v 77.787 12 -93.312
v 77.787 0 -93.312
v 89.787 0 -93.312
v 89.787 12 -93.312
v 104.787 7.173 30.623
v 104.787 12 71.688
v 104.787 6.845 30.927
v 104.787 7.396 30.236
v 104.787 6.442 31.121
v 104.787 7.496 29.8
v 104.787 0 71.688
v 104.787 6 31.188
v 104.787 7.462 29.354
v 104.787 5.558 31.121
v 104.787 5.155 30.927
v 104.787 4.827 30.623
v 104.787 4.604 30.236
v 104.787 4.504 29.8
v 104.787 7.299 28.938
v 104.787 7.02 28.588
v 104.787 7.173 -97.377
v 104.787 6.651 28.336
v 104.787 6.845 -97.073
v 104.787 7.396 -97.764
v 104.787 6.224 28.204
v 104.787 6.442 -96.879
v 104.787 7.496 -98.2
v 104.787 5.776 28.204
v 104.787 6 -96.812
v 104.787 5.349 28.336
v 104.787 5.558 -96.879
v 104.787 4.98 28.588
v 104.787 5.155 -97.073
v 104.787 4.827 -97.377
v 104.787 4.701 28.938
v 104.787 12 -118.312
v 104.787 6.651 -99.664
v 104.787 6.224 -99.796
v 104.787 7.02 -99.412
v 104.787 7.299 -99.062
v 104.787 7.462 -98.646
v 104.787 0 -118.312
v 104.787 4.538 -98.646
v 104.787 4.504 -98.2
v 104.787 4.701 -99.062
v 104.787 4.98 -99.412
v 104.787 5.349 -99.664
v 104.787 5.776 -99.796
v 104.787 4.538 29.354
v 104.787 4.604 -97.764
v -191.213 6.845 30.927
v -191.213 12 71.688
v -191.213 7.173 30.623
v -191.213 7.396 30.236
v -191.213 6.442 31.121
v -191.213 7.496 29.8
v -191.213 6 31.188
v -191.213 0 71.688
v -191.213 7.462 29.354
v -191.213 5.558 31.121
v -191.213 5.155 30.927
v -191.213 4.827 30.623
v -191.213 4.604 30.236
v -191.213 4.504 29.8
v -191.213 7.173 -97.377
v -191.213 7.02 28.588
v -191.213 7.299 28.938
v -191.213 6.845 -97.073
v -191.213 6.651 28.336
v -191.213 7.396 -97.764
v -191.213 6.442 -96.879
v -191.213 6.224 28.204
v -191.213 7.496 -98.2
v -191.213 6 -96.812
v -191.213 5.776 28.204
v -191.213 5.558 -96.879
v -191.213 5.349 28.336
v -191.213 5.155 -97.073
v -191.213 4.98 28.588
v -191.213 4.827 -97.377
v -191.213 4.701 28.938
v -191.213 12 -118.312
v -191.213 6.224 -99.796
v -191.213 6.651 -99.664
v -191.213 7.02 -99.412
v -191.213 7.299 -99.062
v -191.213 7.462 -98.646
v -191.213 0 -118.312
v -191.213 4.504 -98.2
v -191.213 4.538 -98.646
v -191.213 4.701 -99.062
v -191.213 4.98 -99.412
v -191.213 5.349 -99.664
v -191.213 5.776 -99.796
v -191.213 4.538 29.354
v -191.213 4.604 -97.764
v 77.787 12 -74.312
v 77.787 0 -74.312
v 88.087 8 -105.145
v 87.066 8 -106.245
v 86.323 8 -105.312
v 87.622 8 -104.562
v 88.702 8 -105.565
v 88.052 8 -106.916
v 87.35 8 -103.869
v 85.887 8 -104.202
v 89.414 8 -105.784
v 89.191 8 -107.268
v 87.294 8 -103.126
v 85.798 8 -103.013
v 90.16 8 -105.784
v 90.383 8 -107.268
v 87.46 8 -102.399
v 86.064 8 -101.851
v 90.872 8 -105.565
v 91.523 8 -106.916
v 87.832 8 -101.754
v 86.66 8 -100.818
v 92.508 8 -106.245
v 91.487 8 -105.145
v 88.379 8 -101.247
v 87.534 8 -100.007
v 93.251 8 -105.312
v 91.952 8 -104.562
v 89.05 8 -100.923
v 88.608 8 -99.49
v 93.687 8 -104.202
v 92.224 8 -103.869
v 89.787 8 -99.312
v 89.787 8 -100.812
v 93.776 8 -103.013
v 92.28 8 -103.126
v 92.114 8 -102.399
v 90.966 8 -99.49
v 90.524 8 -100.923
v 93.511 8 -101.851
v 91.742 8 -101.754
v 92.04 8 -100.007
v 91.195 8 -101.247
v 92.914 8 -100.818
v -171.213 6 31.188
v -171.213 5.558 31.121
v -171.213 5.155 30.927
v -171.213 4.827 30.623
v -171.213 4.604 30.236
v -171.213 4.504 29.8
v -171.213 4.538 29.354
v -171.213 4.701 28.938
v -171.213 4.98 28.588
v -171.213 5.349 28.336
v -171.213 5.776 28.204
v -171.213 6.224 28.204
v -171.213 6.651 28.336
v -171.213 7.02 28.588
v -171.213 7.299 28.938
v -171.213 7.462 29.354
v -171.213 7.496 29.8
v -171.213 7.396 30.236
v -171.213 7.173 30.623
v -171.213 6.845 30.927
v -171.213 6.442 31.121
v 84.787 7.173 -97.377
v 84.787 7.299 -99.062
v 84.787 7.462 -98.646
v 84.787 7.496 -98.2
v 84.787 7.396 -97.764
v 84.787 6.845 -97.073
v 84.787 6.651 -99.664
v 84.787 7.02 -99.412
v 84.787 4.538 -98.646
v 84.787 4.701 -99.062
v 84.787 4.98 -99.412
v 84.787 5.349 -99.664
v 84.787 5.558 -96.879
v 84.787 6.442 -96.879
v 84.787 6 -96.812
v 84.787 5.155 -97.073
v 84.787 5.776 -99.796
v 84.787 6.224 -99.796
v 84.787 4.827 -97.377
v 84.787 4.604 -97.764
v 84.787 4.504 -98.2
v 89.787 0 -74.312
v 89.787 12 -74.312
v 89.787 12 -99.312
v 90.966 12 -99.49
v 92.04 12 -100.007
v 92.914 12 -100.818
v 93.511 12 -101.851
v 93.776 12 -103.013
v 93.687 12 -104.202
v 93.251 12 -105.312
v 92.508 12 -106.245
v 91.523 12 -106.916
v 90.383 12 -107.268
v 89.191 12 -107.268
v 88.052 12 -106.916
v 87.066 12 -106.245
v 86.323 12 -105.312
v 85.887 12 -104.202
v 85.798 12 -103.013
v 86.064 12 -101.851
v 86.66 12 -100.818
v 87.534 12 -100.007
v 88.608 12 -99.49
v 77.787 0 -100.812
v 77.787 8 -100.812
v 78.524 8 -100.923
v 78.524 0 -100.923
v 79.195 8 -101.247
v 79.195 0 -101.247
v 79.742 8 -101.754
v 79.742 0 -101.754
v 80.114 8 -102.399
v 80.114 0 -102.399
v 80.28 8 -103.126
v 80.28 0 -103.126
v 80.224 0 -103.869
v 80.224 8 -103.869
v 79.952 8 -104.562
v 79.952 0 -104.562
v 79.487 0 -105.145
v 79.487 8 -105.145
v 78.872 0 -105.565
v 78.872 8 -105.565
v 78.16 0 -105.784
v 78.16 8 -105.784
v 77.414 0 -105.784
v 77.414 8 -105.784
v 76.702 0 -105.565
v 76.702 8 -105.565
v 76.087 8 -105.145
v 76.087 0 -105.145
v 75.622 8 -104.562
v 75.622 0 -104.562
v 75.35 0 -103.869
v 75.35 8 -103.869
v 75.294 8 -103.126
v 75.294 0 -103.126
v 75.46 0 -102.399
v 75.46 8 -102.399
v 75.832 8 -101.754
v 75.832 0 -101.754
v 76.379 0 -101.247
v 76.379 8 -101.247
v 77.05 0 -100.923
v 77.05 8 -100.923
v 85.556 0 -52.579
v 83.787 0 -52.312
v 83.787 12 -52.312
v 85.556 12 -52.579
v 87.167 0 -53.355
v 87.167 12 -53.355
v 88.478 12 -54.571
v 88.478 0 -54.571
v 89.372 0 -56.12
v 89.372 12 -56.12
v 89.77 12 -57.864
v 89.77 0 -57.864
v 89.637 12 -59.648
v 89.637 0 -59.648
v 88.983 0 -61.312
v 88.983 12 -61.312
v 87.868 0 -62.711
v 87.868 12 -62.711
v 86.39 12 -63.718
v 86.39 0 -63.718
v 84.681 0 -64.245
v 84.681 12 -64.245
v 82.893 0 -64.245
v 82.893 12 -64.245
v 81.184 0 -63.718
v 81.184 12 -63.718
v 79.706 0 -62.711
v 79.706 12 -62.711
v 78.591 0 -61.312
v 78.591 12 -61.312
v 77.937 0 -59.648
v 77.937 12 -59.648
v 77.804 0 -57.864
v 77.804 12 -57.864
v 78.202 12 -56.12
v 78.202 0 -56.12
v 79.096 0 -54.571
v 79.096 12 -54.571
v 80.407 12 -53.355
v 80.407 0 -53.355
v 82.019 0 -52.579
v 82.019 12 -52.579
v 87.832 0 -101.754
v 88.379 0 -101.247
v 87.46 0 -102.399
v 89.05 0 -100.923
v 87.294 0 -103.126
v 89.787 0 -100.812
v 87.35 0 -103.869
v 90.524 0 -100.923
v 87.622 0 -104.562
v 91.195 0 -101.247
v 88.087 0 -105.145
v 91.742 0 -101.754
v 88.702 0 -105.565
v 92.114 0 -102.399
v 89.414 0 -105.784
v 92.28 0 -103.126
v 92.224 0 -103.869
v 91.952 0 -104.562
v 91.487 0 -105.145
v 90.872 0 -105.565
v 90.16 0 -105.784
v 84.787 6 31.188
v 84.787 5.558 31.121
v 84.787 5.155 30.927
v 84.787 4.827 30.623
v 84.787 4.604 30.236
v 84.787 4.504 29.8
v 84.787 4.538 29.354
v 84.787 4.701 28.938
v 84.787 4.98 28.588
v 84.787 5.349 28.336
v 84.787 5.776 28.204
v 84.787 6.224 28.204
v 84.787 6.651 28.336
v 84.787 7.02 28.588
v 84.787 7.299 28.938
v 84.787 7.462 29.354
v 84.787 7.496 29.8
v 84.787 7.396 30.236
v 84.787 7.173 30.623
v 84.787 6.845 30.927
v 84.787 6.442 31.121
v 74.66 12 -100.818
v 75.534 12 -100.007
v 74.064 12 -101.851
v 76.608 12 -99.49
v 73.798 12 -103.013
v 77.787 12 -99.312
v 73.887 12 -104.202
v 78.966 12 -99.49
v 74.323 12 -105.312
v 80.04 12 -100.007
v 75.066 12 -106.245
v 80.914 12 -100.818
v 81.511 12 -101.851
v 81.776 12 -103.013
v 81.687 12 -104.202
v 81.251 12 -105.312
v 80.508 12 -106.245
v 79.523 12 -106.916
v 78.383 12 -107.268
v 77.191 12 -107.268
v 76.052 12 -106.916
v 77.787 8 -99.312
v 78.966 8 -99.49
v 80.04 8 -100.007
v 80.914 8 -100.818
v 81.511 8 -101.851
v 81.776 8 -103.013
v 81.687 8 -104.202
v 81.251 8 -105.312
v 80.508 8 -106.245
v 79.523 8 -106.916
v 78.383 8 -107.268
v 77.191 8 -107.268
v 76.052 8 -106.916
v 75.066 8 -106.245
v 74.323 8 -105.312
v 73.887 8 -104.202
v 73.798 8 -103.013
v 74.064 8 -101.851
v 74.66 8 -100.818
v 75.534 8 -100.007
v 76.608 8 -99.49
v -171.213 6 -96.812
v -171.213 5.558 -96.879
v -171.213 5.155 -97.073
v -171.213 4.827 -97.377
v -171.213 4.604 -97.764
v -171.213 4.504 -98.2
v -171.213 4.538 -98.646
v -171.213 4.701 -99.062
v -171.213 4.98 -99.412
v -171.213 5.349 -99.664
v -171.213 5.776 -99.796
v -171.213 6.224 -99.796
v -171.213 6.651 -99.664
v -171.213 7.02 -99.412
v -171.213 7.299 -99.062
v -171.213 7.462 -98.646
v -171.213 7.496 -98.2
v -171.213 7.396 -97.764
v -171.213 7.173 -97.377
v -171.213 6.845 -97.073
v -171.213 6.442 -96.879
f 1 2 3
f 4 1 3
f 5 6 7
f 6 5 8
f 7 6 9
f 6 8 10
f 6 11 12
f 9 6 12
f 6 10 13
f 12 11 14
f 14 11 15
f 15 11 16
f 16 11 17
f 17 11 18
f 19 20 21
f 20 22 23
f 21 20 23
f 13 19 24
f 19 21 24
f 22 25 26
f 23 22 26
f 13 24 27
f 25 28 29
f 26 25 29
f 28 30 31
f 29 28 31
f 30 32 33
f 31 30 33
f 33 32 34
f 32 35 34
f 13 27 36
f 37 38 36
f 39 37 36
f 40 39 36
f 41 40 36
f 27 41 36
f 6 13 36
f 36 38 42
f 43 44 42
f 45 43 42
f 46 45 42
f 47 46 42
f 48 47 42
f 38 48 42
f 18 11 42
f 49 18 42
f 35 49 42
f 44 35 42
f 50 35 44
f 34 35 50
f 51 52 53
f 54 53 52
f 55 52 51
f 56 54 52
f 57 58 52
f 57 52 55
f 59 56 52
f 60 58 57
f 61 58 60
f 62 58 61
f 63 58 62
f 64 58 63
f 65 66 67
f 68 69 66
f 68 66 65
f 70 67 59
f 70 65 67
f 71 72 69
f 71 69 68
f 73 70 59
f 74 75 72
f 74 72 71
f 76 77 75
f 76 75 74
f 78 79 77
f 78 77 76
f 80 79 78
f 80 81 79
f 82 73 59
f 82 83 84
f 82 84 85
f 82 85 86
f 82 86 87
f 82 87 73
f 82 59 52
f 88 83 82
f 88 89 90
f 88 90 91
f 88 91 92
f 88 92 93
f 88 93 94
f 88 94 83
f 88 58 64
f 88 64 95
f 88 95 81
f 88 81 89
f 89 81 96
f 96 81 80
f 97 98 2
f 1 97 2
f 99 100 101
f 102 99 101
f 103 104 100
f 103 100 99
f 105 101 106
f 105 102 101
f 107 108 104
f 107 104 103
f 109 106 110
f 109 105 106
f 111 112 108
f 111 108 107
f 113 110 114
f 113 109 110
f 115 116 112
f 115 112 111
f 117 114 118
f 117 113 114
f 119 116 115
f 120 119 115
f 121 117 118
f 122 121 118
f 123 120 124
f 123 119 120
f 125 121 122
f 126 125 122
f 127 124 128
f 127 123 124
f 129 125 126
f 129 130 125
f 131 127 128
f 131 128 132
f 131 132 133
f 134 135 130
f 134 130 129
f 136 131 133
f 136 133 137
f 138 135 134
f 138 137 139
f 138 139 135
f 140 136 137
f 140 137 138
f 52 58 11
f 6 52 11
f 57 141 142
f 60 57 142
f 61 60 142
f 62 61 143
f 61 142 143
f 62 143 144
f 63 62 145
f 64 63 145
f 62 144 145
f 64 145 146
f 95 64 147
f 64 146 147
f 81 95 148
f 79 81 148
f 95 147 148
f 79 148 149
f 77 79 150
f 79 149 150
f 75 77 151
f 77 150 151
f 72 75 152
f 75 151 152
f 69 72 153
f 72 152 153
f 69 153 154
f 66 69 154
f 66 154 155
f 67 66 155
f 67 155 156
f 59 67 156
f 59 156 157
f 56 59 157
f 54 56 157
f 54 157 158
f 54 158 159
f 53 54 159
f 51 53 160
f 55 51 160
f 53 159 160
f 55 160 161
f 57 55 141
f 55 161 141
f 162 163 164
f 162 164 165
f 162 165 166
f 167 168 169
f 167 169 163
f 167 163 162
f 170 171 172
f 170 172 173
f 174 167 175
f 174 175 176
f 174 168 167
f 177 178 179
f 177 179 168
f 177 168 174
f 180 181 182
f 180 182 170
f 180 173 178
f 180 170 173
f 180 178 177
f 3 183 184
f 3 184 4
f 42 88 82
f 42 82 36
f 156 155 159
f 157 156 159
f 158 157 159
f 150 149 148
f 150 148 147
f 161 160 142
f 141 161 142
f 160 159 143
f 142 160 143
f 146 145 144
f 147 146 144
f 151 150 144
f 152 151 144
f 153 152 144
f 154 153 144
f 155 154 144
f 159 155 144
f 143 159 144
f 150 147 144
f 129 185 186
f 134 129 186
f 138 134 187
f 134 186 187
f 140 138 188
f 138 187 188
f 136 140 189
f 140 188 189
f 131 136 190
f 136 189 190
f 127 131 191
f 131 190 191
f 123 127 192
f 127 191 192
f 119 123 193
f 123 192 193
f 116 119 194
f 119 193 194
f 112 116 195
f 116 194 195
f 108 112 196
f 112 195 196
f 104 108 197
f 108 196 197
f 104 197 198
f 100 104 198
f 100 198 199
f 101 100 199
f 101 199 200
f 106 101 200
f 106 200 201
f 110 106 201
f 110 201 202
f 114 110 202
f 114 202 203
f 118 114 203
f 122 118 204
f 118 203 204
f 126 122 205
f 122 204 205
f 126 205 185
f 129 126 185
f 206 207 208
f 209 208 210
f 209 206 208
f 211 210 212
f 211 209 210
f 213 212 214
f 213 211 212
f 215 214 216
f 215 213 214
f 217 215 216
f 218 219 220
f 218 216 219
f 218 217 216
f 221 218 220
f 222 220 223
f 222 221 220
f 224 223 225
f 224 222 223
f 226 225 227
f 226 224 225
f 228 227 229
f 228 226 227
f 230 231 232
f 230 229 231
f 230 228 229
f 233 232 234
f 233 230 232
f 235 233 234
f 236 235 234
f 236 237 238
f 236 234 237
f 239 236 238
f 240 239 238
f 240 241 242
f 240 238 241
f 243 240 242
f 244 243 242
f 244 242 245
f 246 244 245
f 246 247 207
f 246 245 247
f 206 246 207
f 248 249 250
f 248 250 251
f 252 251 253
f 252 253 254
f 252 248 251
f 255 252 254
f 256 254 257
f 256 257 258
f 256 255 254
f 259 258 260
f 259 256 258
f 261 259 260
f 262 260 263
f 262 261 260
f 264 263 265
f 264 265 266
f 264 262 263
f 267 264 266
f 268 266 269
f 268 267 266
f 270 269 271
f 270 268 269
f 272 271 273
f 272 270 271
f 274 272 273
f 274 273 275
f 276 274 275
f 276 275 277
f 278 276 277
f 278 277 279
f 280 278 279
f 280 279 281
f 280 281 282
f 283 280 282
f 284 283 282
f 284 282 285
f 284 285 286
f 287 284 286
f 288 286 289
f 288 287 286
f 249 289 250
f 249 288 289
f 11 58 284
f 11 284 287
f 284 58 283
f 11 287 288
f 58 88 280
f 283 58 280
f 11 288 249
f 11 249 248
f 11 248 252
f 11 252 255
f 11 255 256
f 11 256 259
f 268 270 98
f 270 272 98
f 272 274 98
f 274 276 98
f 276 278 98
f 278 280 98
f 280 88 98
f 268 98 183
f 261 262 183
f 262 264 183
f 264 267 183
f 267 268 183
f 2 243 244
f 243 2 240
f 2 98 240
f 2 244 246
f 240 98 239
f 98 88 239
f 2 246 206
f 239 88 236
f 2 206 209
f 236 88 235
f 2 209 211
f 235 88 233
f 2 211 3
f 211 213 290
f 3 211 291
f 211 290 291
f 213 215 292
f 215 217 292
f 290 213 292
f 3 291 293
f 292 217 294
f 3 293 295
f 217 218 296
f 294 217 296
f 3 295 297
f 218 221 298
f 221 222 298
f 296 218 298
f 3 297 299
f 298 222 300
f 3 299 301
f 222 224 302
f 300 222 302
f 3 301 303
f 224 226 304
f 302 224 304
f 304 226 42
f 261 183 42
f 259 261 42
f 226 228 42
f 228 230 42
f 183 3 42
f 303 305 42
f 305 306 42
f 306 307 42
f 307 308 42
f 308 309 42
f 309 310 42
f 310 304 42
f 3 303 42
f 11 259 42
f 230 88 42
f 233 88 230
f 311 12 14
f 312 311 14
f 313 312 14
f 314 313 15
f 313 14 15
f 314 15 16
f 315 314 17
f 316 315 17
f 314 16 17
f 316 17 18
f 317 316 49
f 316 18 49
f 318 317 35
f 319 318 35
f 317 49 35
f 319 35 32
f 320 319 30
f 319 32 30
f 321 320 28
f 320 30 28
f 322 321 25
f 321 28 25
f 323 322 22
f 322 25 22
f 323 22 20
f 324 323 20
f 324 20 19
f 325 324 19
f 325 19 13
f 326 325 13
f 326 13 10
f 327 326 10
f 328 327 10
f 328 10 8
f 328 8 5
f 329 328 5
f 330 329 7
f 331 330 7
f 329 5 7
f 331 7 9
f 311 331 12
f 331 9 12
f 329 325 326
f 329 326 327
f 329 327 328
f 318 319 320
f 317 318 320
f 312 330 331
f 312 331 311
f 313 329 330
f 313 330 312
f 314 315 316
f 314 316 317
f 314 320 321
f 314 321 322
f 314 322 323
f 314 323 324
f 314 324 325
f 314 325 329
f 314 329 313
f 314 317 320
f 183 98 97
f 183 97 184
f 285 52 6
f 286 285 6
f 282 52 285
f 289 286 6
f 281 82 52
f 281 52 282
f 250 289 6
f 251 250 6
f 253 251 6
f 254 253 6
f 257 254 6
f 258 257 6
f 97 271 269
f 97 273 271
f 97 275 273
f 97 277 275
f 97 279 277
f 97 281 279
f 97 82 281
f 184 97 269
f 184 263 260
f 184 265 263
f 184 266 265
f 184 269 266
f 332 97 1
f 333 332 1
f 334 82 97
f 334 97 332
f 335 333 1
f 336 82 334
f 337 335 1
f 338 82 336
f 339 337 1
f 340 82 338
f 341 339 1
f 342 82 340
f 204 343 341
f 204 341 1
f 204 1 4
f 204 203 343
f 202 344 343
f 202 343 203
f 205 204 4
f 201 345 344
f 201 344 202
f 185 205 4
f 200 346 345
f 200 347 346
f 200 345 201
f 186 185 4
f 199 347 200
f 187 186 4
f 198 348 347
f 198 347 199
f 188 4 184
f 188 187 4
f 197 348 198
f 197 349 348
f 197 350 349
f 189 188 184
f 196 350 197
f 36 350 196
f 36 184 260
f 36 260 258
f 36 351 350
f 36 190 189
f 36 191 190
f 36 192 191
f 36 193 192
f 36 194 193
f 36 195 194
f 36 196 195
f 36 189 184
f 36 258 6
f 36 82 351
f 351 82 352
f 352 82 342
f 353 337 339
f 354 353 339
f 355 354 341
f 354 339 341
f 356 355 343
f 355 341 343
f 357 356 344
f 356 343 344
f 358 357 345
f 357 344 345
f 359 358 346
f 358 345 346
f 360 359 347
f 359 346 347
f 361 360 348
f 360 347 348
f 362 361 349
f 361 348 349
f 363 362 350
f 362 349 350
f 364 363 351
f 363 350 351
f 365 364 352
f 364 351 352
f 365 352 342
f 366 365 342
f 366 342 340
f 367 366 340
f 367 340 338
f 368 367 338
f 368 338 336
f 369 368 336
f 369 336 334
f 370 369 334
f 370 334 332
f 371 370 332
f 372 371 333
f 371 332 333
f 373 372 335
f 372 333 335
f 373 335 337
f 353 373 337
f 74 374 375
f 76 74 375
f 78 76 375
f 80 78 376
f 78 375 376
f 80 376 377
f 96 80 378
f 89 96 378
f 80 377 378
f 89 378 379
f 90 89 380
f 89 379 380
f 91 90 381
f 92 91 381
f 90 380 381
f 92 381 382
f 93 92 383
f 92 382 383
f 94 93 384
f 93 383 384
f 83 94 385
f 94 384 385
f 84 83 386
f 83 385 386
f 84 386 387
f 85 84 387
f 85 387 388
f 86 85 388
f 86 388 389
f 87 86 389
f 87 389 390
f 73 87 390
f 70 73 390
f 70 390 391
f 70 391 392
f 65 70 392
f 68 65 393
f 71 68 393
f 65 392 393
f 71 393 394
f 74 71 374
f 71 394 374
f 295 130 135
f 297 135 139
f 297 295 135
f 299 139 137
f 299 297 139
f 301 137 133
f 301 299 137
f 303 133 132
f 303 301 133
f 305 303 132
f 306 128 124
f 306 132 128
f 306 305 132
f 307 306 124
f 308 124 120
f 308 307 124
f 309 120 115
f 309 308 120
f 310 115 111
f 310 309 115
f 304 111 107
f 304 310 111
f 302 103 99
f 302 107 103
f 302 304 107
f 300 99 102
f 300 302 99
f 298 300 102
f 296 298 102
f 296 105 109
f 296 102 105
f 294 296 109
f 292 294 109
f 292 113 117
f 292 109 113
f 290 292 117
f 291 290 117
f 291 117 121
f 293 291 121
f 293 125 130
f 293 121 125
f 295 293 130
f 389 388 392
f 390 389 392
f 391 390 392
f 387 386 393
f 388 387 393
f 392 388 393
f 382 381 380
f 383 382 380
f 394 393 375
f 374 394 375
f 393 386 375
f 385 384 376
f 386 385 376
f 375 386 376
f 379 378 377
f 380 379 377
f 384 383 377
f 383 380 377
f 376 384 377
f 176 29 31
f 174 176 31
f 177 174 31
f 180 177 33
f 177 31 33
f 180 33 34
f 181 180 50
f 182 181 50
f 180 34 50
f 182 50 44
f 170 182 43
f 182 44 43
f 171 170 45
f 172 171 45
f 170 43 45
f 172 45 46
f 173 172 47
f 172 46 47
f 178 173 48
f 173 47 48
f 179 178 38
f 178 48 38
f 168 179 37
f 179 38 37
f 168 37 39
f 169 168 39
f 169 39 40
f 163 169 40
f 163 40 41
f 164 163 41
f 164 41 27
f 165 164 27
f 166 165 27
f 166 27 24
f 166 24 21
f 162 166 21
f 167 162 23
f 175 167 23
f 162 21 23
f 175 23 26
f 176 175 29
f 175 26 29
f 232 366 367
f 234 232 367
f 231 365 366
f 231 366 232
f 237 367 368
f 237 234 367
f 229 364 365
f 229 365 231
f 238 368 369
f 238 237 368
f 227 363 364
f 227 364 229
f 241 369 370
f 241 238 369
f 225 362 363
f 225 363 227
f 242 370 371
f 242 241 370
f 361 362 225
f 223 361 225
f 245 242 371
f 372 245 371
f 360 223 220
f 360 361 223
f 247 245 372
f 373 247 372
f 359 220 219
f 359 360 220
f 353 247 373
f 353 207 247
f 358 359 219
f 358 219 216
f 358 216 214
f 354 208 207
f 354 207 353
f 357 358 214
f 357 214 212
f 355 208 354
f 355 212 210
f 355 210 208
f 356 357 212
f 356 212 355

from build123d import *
from OCP.BRepAlgoAPI import BRepAlgoAPI_Cut
from OCP.TopTools import TopTools_ListOfShape

# Parameters (mm, degrees)
SKETCH1_W           = 296
SKETCH1_H           = 190
SKETCH1_R           = 6
SKETCH1_R_2         = 2.5
SKETCH1_W_2         = 12
SKETCH1_H_2         = 19
BOSS_EXTRUDE1_DEPTH = 12
CUT_EXTRUDE2_START  = 104.787049
SKETCH3_R           = 1.5
CUT_EXTRUDE2_DEPTH  = 20
CUT_EXTRUDE3_START  = -171.212951
SKETCH3_2_R         = 1.5
CUT_EXTRUDE3_DEPTH  = 20
CUT_EXTRUDE4_START  = 12
SKETCH4_R           = 4
CUT_EXTRUDE4_DEPTH  = 4


with BuildPart() as part:
    # Sketch1 → Boss-Extrude1 (new body)
    with BuildSketch(Plane(origin=(0, 0, 0), x_dir=(1, 0, 0), z_dir=(0, 1, 0))):
        with Locations((-43.212950637, 23.312387878)):
            Rectangle(SKETCH1_W, SKETCH1_H)
        with Locations(Location((83.787049363, 58.312387878, 0), (0, 0, 270))):
            Circle(SKETCH1_R, mode=Mode.SUBTRACT)
        with Locations(Location((89.787049363, 103.312387878, 0), (0, 0, 270))):
            Circle(SKETCH1_R_2, mode=Mode.SUBTRACT)
        with Locations(Location((77.787049363, 103.312387878, 0), (0, 0, 270))):
            Circle(SKETCH1_R_2, mode=Mode.SUBTRACT)
        with Locations((83.787049363, 83.812387878)):
            Rectangle(SKETCH1_W_2, SKETCH1_H_2, mode=Mode.SUBTRACT)
    extrude(amount=BOSS_EXTRUDE1_DEPTH)


with BuildPart() as cut_extrude2_tool:
    # Sketch3 → Cut-Extrude2 (new body)
    with BuildSketch(Plane(origin=(0, 0, 0), x_dir=(0, 0, -1), z_dir=(1, 0, 0)).offset(CUT_EXTRUDE2_START)):
        with Locations(Location((98.312387878, 6, 0), (0, 0, 180))):
            Circle(SKETCH3_R)
        with Locations(Location((-29.687612122, 6, 0), (0, 0, 180))):
            Circle(SKETCH3_R)
    extrude(amount=-CUT_EXTRUDE2_DEPTH)


with BuildPart() as part_1:
    add(part.part)

    # Cut-Extrude2: cut by cut_extrude2_tool, with a tolerance
    cut_extrude2_stock = TopTools_ListOfShape()
    cut_extrude2_stock.Append(part_1.part.wrapped)
    cut_extrude2_tools = TopTools_ListOfShape()
    cut_extrude2_tools.Append(cut_extrude2_tool.part.wrapped)
    cut_extrude2_cut = BRepAlgoAPI_Cut()
    cut_extrude2_cut.SetArguments(cut_extrude2_stock)
    cut_extrude2_cut.SetTools(cut_extrude2_tools)
    cut_extrude2_cut.SetFuzzyValue(0.00001)
    cut_extrude2_cut.Build()
    add(Compound.cast(cut_extrude2_cut.Shape()).solids(), mode=Mode.REPLACE)

    # Sketch3<2> → Cut-Extrude3 (cut)
    with BuildSketch(Plane(origin=(0, 0, 0), x_dir=(0, 0, -1), z_dir=(1, 0, 0)).offset(CUT_EXTRUDE3_START)):
        with Locations(Location((98.312387878, 6, 0), (0, 0, 180))):
            Circle(SKETCH3_2_R)
        with Locations(Location((-29.687612122, 6, 0), (0, 0, 180))):
            Circle(SKETCH3_2_R)
    extrude(amount=-CUT_EXTRUDE3_DEPTH, mode=Mode.SUBTRACT)

    # Sketch4 → Cut-Extrude4 (cut)
    with BuildSketch(Plane(origin=(0, 0, 0), x_dir=(1, 0, 0), z_dir=(0, 1, 0)).offset(CUT_EXTRUDE4_START)):
        with Locations(Location((89.787049363, 103.312387878, 0), (0, 0, 270))):
            Circle(SKETCH4_R)
        with Locations(Location((77.787049363, 103.312387878, 0), (0, 0, 270))):
            Circle(SKETCH4_R)
    extrude(amount=-CUT_EXTRUDE4_DEPTH, mode=Mode.SUBTRACT)


solid = part_1.part
